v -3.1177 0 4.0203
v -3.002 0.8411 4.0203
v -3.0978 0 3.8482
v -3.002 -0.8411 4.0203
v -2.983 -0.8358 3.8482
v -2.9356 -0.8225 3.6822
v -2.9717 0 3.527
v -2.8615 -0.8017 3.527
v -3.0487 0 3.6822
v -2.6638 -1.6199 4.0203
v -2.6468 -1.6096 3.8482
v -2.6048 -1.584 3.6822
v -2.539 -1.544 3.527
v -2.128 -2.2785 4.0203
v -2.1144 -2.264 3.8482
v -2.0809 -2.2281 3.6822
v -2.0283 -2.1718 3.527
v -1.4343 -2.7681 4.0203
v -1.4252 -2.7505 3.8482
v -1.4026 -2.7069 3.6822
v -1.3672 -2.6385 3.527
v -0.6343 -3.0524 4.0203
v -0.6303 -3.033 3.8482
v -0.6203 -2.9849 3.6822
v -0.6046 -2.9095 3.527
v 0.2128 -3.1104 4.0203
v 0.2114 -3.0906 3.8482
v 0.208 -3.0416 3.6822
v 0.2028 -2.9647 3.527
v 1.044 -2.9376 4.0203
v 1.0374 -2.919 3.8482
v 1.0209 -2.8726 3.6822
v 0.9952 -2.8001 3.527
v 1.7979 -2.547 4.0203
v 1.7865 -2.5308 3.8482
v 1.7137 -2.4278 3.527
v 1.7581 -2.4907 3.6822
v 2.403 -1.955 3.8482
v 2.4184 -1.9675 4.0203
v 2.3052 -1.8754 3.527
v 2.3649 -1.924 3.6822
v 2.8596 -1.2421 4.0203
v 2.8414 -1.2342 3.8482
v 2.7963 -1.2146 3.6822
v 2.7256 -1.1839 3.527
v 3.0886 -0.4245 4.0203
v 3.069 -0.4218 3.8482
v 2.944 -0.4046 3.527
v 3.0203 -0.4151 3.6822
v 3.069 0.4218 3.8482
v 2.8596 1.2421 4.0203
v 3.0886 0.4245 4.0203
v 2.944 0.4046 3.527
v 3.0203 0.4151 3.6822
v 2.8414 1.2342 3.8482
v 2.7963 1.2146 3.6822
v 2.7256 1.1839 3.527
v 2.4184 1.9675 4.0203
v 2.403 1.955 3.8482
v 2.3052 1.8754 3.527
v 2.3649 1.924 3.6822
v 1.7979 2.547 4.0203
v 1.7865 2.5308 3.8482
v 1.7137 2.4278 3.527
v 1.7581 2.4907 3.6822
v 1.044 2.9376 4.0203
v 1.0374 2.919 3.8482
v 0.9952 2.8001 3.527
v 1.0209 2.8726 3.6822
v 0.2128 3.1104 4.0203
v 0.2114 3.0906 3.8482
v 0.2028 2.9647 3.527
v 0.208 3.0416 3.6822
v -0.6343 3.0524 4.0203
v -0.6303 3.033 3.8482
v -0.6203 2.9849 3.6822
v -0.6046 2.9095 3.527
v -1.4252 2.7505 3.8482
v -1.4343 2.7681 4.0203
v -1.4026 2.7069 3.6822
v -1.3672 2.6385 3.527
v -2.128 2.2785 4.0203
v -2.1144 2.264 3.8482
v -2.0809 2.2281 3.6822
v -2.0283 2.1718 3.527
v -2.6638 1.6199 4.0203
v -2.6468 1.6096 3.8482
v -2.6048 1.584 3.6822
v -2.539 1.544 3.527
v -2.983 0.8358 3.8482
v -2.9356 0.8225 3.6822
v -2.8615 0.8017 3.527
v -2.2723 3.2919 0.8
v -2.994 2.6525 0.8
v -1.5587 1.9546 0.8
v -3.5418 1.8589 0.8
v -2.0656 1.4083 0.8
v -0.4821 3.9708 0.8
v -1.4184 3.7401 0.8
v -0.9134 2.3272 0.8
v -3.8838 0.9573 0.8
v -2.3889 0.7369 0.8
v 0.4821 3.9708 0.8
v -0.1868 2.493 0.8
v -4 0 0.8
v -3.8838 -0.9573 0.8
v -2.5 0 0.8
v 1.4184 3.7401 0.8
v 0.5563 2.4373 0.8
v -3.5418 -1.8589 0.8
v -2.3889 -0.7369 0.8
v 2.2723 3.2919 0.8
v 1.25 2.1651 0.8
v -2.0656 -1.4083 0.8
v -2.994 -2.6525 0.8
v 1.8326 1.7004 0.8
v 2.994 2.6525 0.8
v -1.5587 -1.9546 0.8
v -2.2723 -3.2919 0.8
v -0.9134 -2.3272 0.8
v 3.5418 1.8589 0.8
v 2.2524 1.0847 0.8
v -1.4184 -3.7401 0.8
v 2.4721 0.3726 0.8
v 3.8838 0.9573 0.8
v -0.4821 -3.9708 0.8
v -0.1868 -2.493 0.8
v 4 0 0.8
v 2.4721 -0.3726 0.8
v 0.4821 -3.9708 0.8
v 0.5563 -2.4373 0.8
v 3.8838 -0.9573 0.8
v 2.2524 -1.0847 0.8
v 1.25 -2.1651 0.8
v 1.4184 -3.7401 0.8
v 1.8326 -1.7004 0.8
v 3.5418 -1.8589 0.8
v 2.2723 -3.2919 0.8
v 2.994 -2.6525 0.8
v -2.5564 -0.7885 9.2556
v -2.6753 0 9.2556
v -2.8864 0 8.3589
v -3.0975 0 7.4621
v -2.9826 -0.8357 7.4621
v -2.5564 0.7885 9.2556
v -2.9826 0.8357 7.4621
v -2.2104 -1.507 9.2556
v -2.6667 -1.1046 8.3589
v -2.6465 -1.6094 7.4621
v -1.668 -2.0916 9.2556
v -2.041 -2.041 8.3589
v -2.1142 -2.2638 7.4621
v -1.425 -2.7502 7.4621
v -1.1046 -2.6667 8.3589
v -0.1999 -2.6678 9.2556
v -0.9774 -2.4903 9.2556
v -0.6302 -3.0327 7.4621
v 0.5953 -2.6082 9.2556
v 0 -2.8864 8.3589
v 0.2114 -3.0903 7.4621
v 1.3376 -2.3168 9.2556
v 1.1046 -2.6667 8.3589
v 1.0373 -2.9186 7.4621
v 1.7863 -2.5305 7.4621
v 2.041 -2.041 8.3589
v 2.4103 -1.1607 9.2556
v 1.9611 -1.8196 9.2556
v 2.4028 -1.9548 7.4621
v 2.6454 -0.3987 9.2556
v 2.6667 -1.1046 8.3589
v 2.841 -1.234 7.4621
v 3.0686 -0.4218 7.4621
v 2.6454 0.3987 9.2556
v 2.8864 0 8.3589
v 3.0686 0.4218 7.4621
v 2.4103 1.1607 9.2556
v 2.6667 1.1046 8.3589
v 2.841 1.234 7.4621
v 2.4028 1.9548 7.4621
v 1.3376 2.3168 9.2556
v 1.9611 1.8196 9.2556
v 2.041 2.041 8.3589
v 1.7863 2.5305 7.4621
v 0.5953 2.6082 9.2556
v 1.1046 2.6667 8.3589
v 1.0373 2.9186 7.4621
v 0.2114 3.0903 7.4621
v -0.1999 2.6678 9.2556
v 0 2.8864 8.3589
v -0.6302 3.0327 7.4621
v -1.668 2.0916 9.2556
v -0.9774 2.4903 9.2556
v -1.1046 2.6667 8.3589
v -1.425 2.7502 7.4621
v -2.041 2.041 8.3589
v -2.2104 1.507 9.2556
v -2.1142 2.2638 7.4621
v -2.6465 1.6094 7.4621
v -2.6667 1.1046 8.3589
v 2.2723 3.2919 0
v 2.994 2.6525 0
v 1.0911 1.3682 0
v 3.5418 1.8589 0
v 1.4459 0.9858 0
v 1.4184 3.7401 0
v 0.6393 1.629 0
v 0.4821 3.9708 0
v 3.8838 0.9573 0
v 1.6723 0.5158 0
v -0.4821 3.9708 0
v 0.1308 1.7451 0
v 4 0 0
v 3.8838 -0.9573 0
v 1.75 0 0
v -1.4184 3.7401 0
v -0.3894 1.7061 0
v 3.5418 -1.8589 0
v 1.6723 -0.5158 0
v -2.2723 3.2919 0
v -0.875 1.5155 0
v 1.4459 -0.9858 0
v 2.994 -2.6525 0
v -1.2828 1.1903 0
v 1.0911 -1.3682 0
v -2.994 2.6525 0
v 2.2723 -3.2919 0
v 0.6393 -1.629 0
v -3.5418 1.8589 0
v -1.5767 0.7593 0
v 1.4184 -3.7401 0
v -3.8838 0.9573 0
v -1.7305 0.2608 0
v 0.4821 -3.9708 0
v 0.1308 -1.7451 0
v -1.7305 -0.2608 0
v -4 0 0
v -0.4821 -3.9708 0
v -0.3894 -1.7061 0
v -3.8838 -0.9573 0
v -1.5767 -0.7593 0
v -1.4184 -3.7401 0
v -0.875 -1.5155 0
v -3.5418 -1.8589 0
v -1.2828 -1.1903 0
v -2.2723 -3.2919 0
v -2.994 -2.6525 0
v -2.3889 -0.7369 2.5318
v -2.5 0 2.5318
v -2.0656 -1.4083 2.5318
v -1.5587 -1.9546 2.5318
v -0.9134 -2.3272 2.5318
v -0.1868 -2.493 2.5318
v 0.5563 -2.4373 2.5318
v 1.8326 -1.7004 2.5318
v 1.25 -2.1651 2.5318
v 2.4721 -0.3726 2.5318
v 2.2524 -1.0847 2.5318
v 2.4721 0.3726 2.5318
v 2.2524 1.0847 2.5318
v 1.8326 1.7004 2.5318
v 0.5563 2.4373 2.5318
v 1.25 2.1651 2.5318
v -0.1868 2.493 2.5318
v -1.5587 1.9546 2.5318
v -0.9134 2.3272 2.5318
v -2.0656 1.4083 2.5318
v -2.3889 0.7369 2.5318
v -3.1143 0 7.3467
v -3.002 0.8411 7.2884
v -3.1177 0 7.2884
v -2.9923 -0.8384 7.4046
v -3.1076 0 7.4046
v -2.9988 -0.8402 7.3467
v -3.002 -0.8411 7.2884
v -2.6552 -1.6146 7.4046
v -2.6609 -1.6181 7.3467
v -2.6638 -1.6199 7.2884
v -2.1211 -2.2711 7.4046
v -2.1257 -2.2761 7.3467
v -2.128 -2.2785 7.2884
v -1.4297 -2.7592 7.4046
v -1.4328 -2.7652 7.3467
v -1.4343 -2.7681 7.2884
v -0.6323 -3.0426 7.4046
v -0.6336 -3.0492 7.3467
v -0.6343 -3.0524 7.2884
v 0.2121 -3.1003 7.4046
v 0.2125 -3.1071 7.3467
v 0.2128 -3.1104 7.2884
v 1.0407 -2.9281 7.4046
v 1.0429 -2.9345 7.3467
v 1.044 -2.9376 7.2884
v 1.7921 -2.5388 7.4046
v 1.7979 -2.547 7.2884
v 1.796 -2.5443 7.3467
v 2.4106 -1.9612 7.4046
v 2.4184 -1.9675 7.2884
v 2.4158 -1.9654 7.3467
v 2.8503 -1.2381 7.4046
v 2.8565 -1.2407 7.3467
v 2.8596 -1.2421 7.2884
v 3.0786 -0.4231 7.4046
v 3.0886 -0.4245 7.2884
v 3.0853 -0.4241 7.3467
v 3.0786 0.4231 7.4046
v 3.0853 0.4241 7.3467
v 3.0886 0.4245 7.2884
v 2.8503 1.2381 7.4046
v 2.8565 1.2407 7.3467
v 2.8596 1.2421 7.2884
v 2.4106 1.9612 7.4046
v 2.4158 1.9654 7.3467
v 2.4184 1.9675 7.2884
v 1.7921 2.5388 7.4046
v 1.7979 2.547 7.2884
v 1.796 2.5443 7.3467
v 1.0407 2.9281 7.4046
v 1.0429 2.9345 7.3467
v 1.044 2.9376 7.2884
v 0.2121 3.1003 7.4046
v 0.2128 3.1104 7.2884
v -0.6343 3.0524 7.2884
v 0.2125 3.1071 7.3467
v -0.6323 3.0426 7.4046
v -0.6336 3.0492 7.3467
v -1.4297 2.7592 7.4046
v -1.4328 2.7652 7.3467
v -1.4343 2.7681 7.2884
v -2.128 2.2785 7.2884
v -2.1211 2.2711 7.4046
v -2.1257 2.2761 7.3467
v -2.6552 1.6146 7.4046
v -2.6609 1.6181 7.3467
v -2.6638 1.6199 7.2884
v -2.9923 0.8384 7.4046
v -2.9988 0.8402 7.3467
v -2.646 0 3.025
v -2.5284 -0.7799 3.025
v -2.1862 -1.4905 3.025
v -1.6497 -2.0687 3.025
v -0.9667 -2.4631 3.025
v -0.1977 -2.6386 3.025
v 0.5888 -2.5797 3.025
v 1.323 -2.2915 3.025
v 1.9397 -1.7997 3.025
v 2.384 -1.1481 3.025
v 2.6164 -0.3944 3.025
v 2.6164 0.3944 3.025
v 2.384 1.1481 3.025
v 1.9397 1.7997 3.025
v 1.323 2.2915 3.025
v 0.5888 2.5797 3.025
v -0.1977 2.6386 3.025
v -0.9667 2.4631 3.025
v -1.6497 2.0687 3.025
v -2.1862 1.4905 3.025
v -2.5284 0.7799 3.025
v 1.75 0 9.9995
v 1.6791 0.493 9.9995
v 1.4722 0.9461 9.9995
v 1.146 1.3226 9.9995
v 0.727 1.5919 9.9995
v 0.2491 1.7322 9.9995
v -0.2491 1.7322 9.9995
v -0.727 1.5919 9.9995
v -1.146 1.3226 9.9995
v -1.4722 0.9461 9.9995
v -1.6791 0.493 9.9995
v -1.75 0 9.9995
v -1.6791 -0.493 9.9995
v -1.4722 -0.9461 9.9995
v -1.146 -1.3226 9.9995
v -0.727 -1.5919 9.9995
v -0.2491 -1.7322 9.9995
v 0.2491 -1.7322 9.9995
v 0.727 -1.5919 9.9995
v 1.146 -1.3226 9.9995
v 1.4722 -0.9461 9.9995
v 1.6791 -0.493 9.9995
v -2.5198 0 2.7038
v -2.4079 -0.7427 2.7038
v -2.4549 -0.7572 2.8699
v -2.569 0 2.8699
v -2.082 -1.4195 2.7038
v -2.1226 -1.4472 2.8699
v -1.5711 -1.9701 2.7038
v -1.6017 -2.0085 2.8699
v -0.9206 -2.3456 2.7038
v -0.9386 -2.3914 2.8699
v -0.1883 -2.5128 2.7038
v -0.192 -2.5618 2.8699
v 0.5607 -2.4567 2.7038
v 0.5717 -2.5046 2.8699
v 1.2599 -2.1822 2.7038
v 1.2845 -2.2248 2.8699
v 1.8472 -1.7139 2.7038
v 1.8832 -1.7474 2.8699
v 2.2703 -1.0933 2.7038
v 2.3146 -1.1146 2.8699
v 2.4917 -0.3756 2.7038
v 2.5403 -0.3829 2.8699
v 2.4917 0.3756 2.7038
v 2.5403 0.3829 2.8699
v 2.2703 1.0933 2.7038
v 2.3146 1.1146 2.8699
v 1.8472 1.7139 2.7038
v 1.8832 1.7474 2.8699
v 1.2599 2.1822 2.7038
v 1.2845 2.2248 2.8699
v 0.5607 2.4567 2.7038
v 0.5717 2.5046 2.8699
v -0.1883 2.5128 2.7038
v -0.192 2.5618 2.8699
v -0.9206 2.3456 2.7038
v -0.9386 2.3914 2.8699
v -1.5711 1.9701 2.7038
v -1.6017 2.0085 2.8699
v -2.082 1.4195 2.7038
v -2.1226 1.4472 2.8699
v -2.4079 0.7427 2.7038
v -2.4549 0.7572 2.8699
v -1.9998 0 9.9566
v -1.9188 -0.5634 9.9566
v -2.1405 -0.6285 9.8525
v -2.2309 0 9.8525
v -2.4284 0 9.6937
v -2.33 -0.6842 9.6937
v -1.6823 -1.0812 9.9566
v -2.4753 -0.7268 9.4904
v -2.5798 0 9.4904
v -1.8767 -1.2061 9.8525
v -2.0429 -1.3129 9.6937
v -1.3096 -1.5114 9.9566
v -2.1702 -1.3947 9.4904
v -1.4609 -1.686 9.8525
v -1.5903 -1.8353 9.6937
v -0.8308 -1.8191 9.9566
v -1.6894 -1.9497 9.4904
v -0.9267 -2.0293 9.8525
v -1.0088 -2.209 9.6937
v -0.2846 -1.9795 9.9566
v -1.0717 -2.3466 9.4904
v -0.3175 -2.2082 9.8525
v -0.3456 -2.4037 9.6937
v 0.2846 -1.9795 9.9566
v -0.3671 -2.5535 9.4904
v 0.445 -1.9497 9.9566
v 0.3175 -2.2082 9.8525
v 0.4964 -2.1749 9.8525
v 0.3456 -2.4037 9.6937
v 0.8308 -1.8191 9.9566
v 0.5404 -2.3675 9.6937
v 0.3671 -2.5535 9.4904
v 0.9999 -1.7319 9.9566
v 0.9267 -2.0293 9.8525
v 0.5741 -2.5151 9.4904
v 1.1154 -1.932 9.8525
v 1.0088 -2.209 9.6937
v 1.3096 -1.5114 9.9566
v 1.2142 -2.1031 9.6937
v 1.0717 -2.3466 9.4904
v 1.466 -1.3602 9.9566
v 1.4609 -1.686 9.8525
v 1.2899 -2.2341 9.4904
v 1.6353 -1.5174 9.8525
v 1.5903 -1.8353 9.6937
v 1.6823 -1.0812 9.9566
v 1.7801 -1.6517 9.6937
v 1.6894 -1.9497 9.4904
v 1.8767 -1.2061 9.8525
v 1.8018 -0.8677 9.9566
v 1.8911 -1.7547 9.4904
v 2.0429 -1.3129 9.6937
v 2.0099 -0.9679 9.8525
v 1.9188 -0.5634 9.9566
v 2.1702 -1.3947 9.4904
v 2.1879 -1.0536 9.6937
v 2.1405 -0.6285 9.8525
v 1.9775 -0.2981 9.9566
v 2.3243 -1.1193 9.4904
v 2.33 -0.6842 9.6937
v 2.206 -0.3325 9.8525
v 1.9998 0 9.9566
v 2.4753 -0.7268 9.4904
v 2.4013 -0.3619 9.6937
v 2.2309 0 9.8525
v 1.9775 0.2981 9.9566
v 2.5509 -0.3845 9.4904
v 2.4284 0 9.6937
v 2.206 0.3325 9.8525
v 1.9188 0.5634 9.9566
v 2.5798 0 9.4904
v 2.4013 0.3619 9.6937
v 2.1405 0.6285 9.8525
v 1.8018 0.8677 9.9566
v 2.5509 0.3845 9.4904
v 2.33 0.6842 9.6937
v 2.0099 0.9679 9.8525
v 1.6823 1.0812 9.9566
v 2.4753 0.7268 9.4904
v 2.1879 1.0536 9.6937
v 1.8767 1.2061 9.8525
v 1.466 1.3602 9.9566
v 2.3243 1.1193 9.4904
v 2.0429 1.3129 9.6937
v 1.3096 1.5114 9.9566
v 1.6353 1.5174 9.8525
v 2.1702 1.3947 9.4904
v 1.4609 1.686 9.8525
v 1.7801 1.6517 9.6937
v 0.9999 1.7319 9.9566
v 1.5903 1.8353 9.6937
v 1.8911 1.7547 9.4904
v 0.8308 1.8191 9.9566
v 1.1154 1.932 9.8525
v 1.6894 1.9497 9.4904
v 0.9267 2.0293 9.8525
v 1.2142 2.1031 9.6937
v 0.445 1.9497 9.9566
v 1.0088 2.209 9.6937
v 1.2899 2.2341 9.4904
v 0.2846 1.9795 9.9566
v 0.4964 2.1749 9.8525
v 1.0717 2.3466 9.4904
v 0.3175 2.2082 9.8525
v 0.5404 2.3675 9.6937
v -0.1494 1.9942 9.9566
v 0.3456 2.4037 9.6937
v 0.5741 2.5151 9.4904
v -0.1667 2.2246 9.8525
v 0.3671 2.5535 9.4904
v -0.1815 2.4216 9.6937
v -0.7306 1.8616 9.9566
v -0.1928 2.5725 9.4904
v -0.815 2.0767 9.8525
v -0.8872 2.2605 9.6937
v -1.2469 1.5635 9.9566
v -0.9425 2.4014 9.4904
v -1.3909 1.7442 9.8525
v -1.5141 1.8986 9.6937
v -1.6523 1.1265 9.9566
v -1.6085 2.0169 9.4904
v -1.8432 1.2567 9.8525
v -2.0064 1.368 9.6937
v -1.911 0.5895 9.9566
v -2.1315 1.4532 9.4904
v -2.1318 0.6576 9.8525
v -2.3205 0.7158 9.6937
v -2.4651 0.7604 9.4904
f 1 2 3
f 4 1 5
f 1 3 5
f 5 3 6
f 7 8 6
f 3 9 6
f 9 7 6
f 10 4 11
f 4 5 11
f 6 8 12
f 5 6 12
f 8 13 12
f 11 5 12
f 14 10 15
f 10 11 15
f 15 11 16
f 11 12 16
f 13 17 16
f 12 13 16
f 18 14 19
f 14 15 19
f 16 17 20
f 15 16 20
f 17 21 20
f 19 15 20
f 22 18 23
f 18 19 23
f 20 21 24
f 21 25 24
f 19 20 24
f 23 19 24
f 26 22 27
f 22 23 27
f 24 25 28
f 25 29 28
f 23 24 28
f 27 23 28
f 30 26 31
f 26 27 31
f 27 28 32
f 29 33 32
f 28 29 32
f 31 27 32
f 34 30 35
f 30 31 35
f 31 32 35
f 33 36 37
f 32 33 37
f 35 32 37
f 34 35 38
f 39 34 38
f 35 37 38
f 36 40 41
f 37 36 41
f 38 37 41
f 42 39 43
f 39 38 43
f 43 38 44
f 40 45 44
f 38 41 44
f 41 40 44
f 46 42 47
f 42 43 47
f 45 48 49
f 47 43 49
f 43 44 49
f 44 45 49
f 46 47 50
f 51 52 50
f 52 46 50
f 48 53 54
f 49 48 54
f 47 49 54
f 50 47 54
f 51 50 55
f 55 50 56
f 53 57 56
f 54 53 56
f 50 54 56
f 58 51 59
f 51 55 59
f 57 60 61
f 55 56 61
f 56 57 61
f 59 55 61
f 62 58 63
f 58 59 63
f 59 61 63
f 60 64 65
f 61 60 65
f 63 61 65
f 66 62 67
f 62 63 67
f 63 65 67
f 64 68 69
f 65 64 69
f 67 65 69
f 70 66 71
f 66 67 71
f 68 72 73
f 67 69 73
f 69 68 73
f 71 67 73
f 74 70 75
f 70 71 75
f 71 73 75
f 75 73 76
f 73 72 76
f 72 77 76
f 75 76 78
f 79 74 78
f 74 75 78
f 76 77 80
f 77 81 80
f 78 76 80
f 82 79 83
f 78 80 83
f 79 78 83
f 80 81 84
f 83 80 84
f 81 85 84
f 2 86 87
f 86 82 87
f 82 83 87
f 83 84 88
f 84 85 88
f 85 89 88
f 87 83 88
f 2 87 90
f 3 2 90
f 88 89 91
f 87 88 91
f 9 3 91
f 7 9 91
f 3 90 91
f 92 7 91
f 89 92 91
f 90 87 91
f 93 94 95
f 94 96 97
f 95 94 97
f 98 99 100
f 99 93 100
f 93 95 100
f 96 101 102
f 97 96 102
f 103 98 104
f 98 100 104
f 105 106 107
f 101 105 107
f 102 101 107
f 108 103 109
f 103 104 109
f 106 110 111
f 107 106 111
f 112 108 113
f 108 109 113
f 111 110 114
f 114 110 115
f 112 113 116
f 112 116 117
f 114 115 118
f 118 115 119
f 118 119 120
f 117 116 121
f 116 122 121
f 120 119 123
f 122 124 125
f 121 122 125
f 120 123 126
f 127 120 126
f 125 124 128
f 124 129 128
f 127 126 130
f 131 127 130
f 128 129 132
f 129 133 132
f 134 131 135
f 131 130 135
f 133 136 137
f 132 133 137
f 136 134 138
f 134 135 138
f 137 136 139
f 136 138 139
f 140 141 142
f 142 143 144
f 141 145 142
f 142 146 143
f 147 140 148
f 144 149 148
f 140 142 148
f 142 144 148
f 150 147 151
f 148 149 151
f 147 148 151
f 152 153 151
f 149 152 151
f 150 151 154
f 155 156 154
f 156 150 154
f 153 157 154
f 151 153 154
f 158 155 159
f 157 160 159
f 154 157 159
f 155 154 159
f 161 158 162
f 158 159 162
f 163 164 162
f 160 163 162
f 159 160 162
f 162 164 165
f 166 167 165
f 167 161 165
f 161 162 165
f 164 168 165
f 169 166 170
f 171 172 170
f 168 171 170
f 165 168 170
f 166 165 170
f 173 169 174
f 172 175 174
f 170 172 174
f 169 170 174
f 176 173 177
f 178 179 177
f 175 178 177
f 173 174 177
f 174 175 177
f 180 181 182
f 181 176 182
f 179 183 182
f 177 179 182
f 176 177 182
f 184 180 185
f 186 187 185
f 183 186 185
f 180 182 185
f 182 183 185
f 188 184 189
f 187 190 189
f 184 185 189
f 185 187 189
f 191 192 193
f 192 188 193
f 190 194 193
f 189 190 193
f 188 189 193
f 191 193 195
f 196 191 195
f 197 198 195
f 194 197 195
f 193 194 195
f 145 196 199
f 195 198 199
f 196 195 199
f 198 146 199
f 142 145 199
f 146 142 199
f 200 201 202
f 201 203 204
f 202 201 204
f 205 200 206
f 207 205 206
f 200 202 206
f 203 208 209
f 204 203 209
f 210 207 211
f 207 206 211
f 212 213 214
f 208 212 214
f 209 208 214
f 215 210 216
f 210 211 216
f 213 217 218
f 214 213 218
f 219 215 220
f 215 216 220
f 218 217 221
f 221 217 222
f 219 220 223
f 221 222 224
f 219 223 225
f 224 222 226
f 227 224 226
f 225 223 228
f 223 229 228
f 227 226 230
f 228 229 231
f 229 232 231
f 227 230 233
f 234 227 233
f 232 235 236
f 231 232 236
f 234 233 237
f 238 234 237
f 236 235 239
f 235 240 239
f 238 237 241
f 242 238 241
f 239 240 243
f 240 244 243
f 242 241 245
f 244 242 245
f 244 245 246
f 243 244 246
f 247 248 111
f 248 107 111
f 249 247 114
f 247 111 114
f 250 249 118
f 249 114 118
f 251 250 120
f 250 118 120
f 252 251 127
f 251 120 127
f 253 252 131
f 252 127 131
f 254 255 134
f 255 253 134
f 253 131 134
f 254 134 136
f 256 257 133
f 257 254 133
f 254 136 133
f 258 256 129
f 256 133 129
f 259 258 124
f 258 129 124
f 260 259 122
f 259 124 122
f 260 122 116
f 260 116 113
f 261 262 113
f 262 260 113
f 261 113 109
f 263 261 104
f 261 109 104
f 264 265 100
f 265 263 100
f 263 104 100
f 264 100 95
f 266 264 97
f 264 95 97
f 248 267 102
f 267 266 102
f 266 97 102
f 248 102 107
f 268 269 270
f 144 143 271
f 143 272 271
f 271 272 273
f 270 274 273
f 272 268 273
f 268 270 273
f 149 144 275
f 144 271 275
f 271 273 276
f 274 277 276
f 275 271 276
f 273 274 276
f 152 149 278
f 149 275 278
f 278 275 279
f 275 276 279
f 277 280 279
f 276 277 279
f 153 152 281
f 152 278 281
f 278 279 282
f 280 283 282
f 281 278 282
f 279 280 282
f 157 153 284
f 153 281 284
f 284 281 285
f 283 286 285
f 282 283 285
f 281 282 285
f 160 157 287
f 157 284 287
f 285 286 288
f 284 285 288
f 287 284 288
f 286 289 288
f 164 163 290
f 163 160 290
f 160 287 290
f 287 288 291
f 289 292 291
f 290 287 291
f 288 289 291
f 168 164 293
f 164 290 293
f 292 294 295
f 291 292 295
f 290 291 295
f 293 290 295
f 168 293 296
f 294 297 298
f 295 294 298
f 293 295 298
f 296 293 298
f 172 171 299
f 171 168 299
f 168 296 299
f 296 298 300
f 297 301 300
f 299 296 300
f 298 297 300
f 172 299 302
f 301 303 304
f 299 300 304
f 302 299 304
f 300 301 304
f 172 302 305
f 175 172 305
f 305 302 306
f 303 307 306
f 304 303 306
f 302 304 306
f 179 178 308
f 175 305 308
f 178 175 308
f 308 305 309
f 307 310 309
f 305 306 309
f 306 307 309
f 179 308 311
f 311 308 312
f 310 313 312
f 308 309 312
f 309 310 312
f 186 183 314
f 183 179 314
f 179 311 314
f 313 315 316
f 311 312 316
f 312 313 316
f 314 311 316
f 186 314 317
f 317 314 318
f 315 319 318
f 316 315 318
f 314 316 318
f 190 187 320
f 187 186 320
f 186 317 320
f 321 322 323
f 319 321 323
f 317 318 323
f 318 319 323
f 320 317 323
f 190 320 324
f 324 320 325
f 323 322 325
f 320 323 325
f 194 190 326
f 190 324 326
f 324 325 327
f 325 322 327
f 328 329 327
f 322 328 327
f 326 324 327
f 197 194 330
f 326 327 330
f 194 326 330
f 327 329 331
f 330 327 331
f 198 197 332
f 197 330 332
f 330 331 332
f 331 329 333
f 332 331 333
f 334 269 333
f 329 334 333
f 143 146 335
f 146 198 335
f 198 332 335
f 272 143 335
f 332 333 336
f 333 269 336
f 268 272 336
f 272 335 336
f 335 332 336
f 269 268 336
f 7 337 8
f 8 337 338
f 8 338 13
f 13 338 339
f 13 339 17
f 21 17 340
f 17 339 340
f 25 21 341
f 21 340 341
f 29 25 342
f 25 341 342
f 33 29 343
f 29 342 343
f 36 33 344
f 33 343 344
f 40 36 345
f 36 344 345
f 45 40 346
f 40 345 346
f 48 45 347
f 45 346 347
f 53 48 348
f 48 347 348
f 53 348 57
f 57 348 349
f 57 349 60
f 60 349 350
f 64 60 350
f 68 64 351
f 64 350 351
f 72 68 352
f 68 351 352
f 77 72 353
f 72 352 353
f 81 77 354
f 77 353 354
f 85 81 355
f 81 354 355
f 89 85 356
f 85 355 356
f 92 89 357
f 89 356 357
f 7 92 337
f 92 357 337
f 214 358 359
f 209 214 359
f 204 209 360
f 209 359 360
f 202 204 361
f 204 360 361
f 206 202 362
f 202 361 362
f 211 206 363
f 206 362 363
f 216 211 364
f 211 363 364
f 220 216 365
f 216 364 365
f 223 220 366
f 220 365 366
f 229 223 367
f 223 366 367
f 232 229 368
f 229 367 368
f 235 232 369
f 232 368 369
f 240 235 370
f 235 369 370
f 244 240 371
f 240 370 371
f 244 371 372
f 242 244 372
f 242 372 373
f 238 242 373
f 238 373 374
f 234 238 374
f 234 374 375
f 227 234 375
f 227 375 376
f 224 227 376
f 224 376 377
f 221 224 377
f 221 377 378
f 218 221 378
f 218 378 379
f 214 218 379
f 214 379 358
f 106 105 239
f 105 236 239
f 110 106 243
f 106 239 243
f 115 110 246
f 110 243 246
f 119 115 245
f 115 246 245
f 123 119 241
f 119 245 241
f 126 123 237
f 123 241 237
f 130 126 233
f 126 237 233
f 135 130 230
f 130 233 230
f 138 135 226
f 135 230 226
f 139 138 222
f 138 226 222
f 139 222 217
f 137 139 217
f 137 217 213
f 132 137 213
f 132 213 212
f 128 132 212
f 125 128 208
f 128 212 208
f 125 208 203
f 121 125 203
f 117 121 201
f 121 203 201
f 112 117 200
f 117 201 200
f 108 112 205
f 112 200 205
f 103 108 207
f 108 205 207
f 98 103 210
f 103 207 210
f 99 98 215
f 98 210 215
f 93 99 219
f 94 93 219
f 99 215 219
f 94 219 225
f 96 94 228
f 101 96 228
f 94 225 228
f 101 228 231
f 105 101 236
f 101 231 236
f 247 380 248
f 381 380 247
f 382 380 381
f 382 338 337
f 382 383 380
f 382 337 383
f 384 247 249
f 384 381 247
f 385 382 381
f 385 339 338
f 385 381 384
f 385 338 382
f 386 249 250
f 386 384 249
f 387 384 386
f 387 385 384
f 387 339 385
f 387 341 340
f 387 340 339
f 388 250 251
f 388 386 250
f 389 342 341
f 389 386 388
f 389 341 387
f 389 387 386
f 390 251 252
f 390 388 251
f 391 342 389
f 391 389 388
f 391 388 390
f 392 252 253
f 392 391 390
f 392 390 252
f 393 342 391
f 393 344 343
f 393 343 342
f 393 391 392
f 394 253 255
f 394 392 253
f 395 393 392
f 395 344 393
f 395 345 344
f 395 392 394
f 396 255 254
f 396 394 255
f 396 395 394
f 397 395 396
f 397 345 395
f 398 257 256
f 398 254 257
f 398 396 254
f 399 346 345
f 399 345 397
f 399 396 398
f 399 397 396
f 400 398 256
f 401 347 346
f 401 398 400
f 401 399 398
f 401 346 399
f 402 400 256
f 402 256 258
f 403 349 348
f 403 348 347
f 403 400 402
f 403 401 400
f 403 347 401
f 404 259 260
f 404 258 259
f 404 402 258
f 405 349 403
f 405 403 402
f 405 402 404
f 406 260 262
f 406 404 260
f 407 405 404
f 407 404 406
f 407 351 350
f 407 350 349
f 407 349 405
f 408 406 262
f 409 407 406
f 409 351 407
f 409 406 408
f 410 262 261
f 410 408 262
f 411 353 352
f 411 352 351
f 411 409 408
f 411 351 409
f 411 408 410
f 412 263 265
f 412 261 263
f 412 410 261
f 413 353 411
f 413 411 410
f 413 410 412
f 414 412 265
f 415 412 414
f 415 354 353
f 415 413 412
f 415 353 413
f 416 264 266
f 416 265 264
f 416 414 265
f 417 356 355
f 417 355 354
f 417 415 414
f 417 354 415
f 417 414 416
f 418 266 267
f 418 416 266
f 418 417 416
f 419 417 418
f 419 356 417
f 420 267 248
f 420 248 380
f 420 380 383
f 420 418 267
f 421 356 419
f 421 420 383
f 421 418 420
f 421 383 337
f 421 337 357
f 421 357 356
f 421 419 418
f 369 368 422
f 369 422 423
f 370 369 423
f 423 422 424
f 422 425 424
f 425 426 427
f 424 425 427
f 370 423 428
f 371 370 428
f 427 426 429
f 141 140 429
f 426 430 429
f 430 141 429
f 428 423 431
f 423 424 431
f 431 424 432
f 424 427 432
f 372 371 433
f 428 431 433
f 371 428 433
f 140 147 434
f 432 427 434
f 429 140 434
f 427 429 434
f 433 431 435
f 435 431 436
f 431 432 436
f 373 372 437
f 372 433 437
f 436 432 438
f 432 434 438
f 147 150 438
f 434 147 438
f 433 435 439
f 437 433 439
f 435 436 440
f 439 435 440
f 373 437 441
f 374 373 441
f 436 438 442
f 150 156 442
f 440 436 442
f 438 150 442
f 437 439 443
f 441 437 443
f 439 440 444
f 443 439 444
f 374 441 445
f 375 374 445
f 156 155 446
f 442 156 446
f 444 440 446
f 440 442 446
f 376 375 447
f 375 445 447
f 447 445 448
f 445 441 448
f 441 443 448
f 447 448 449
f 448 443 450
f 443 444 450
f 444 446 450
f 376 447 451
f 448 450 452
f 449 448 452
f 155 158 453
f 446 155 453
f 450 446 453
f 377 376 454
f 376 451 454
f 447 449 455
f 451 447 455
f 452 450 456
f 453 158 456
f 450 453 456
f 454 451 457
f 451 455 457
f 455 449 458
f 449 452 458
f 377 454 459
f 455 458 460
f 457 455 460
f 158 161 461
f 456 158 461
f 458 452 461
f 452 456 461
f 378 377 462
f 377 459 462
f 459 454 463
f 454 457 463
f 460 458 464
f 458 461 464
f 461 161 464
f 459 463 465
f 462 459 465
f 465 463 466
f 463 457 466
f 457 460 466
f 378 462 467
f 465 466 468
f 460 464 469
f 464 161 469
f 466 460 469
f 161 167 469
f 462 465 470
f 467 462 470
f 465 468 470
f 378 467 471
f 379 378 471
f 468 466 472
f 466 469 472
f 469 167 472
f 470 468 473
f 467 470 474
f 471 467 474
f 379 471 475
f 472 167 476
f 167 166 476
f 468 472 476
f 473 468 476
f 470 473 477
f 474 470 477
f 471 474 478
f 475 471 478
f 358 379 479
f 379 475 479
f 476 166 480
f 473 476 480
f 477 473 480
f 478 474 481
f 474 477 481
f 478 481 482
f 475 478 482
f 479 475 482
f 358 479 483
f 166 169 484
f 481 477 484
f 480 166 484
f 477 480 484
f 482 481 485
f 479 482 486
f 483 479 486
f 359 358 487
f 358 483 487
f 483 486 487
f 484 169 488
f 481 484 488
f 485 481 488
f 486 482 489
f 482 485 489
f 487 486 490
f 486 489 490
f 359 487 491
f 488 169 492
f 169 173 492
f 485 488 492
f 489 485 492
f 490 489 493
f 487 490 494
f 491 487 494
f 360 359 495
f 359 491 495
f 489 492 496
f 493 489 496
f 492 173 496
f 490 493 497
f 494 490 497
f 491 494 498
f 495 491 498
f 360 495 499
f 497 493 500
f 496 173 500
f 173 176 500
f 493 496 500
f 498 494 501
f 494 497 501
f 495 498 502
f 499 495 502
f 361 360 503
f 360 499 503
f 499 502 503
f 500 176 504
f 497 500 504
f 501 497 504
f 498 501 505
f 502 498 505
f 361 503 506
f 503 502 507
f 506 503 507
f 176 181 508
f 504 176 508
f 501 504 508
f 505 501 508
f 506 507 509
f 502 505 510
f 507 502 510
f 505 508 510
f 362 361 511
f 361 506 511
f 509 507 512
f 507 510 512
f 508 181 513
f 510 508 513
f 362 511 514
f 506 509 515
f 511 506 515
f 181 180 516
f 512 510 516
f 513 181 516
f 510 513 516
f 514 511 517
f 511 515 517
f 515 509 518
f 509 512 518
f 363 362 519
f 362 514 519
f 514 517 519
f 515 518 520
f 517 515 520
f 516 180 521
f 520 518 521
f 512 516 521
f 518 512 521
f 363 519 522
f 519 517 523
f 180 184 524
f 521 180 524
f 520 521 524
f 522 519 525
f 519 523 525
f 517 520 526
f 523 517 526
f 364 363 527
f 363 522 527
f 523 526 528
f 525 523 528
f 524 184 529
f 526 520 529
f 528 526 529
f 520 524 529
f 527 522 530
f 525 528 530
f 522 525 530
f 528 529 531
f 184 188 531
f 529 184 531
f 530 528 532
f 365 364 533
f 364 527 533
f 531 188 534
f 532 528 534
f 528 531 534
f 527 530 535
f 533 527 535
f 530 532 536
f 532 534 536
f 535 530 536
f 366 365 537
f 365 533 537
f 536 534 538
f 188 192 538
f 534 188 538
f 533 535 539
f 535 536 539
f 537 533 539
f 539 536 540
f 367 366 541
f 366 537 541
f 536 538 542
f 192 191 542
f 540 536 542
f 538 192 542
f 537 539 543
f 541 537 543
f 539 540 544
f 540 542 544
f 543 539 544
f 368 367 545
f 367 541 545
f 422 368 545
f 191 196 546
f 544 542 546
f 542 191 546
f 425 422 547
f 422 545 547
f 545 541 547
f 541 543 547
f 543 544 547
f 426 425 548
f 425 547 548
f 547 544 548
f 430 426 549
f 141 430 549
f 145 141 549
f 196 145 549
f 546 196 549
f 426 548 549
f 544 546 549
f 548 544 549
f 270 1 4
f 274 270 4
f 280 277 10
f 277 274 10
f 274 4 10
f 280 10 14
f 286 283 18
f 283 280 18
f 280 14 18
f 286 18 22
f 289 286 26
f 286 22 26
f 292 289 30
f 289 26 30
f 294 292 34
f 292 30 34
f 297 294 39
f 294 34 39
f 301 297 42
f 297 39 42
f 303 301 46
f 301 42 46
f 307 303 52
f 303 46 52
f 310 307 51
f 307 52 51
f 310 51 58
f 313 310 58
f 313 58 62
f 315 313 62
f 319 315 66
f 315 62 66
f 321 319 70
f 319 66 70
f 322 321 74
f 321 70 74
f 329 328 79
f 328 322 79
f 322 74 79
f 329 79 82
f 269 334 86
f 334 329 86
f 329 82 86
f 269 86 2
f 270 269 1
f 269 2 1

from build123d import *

# Parameters (mm, degrees)
F2_R     = 1.75
F3_DEPTH = 25


# Not quite as in the source:
# - a fillet or chamfer that OpenCascade refuses, or shapes differently, is made with other operations: its cross-section is extruded or revolved along the edge and cut away or added


with BuildPart() as f1:
    # F0 (on Front) → F1 (revolve)
    with BuildSketch(Plane.XZ):
        Polygon((-4, 0), (0, 0), (0, 10), (-2.5, 10), (-3.1176584307, 7.3764383901), (-3.1176584307, 3.7520567627), (-2.5, 2.8), (-2.5, 0.8), (-4, 0.8), align=None)
    revolve(axis=Axis((0, 0, 5), (0, 0, 1)))

    # F2 (on face) → F3 (cut)
    with BuildSketch(Plane.XY.offset(10)):
        Circle(F2_R)
    extrude(amount=-F3_DEPTH, mode=Mode.SUBTRACT)

    # F4: fillet of radius 1 on 7 edges, made by hand

    # F4_s1 → F4_t2 (revolve)
    with BuildSketch(Plane.XZ):
        with BuildLine():
            ThreePointArc((-2.4996, 2.5034415217), (-2.5408144836, 2.7879202783), (-2.6610688008, 3.0490058884))
            Line((-2.6610688008, 3.0490058884), (-2.5769756809, 3.1035623251))
            ThreePointArc((-2.5769756809, 3.1035623251), (-2.4966090641, 2.9789505293), (-2.4159068801, 2.8545564367))
            Line((-2.4159068801, 2.8545564367), (-2.39976, 2.8))
            ThreePointArc((-2.39976, 2.8), (-2.39976, 2.6517207608), (-2.39936, 2.5034415217))
            Line((-2.39936, 2.5034415217), (-2.4996, 2.5034415217))
        make_face()
    revolve(axis=Axis((0, 0, 2.8), (0, 0, 1)))

    # F4_s3 → F4_t4 (revolve, cut)
    with BuildSketch(Plane.XZ):
        with BuildLine():
            ThreePointArc((-1.7069387157, 10.0004), (-2.3289092353, 9.7839522663), (-2.6821291124, 9.2281351497))
            Line((-2.6821291124, 9.2281351497), (-2.7796481521, 9.251093809))
            ThreePointArc((-2.7796481521, 9.251093809), (-2.6883889182, 9.6369804016), (-2.5975190397, 10.0229586592))
            Line((-2.5975190397, 10.0229586592), (-2.5, 10.1001851443))
            ThreePointArc((-2.5, 10.1001851443), (-2.1034693578, 10.1001851443), (-1.7069387157, 10.1005851443))
            Line((-1.7069387157, 10.1005851443), (-1.7069387157, 10.0004))
        make_face()
    revolve(axis=Axis((0, 0, 10), (0, 0, 1)), mode=Mode.SUBTRACT)

    # F4_s5 → F4_t6 (revolve, cut)
    with BuildSketch(Plane.XZ):
        with BuildLine():
            ThreePointArc((-3.0913827866, 7.489792119), (-3.1113671869, 7.3757078111), (-3.1180584307, 7.2600798179))
            Line((-3.1180584307, 7.2600798179), (-3.2182984307, 7.2600798179))
            ThreePointArc((-3.2182984307, 7.2600798179), (-3.2178984307, 7.318259104), (-3.2178984307, 7.3764383901))
            Line((-3.2178984307, 7.3764383901), (-3.2152308663, 7.3994096202))
            ThreePointArc((-3.2152308663, 7.3994096202), (-3.2018983666, 7.4560406522), (-3.1889552222, 7.5127633491))
            Line((-3.1889552222, 7.5127633491), (-3.0913827866, 7.489792119))
        make_face()
    revolve(axis=Axis((0, 0, 7.3764383901), (0, 0, 1)), mode=Mode.SUBTRACT)

    # F4_s7 → F4_t8 (revolve, cut)
    with BuildSketch(Plane.XZ):
        with BuildLine():
            ThreePointArc((-3.1180584307, 4.048615241), (-3.0768439472, 3.7641364844), (-2.9565896299, 3.5030508742))
            Line((-2.9565896299, 3.5030508742), (-3.0406827498, 3.4484944376))
            ThreePointArc((-3.0406827498, 3.4484944376), (-3.1210493667, 3.5731062334), (-3.2017515506, 3.697500326))
            Line((-3.2017515506, 3.697500326), (-3.2178984307, 3.7520567627))
            ThreePointArc((-3.2178984307, 3.7520567627), (-3.2178984307, 3.9003360018), (-3.2182984307, 4.048615241))
            Line((-3.2182984307, 4.048615241), (-3.1180584307, 4.048615241))
        make_face()
    revolve(axis=Axis((0, 0, 3.7520567627), (0, 0, 1)), mode=Mode.SUBTRACT)


solid = f1.part
